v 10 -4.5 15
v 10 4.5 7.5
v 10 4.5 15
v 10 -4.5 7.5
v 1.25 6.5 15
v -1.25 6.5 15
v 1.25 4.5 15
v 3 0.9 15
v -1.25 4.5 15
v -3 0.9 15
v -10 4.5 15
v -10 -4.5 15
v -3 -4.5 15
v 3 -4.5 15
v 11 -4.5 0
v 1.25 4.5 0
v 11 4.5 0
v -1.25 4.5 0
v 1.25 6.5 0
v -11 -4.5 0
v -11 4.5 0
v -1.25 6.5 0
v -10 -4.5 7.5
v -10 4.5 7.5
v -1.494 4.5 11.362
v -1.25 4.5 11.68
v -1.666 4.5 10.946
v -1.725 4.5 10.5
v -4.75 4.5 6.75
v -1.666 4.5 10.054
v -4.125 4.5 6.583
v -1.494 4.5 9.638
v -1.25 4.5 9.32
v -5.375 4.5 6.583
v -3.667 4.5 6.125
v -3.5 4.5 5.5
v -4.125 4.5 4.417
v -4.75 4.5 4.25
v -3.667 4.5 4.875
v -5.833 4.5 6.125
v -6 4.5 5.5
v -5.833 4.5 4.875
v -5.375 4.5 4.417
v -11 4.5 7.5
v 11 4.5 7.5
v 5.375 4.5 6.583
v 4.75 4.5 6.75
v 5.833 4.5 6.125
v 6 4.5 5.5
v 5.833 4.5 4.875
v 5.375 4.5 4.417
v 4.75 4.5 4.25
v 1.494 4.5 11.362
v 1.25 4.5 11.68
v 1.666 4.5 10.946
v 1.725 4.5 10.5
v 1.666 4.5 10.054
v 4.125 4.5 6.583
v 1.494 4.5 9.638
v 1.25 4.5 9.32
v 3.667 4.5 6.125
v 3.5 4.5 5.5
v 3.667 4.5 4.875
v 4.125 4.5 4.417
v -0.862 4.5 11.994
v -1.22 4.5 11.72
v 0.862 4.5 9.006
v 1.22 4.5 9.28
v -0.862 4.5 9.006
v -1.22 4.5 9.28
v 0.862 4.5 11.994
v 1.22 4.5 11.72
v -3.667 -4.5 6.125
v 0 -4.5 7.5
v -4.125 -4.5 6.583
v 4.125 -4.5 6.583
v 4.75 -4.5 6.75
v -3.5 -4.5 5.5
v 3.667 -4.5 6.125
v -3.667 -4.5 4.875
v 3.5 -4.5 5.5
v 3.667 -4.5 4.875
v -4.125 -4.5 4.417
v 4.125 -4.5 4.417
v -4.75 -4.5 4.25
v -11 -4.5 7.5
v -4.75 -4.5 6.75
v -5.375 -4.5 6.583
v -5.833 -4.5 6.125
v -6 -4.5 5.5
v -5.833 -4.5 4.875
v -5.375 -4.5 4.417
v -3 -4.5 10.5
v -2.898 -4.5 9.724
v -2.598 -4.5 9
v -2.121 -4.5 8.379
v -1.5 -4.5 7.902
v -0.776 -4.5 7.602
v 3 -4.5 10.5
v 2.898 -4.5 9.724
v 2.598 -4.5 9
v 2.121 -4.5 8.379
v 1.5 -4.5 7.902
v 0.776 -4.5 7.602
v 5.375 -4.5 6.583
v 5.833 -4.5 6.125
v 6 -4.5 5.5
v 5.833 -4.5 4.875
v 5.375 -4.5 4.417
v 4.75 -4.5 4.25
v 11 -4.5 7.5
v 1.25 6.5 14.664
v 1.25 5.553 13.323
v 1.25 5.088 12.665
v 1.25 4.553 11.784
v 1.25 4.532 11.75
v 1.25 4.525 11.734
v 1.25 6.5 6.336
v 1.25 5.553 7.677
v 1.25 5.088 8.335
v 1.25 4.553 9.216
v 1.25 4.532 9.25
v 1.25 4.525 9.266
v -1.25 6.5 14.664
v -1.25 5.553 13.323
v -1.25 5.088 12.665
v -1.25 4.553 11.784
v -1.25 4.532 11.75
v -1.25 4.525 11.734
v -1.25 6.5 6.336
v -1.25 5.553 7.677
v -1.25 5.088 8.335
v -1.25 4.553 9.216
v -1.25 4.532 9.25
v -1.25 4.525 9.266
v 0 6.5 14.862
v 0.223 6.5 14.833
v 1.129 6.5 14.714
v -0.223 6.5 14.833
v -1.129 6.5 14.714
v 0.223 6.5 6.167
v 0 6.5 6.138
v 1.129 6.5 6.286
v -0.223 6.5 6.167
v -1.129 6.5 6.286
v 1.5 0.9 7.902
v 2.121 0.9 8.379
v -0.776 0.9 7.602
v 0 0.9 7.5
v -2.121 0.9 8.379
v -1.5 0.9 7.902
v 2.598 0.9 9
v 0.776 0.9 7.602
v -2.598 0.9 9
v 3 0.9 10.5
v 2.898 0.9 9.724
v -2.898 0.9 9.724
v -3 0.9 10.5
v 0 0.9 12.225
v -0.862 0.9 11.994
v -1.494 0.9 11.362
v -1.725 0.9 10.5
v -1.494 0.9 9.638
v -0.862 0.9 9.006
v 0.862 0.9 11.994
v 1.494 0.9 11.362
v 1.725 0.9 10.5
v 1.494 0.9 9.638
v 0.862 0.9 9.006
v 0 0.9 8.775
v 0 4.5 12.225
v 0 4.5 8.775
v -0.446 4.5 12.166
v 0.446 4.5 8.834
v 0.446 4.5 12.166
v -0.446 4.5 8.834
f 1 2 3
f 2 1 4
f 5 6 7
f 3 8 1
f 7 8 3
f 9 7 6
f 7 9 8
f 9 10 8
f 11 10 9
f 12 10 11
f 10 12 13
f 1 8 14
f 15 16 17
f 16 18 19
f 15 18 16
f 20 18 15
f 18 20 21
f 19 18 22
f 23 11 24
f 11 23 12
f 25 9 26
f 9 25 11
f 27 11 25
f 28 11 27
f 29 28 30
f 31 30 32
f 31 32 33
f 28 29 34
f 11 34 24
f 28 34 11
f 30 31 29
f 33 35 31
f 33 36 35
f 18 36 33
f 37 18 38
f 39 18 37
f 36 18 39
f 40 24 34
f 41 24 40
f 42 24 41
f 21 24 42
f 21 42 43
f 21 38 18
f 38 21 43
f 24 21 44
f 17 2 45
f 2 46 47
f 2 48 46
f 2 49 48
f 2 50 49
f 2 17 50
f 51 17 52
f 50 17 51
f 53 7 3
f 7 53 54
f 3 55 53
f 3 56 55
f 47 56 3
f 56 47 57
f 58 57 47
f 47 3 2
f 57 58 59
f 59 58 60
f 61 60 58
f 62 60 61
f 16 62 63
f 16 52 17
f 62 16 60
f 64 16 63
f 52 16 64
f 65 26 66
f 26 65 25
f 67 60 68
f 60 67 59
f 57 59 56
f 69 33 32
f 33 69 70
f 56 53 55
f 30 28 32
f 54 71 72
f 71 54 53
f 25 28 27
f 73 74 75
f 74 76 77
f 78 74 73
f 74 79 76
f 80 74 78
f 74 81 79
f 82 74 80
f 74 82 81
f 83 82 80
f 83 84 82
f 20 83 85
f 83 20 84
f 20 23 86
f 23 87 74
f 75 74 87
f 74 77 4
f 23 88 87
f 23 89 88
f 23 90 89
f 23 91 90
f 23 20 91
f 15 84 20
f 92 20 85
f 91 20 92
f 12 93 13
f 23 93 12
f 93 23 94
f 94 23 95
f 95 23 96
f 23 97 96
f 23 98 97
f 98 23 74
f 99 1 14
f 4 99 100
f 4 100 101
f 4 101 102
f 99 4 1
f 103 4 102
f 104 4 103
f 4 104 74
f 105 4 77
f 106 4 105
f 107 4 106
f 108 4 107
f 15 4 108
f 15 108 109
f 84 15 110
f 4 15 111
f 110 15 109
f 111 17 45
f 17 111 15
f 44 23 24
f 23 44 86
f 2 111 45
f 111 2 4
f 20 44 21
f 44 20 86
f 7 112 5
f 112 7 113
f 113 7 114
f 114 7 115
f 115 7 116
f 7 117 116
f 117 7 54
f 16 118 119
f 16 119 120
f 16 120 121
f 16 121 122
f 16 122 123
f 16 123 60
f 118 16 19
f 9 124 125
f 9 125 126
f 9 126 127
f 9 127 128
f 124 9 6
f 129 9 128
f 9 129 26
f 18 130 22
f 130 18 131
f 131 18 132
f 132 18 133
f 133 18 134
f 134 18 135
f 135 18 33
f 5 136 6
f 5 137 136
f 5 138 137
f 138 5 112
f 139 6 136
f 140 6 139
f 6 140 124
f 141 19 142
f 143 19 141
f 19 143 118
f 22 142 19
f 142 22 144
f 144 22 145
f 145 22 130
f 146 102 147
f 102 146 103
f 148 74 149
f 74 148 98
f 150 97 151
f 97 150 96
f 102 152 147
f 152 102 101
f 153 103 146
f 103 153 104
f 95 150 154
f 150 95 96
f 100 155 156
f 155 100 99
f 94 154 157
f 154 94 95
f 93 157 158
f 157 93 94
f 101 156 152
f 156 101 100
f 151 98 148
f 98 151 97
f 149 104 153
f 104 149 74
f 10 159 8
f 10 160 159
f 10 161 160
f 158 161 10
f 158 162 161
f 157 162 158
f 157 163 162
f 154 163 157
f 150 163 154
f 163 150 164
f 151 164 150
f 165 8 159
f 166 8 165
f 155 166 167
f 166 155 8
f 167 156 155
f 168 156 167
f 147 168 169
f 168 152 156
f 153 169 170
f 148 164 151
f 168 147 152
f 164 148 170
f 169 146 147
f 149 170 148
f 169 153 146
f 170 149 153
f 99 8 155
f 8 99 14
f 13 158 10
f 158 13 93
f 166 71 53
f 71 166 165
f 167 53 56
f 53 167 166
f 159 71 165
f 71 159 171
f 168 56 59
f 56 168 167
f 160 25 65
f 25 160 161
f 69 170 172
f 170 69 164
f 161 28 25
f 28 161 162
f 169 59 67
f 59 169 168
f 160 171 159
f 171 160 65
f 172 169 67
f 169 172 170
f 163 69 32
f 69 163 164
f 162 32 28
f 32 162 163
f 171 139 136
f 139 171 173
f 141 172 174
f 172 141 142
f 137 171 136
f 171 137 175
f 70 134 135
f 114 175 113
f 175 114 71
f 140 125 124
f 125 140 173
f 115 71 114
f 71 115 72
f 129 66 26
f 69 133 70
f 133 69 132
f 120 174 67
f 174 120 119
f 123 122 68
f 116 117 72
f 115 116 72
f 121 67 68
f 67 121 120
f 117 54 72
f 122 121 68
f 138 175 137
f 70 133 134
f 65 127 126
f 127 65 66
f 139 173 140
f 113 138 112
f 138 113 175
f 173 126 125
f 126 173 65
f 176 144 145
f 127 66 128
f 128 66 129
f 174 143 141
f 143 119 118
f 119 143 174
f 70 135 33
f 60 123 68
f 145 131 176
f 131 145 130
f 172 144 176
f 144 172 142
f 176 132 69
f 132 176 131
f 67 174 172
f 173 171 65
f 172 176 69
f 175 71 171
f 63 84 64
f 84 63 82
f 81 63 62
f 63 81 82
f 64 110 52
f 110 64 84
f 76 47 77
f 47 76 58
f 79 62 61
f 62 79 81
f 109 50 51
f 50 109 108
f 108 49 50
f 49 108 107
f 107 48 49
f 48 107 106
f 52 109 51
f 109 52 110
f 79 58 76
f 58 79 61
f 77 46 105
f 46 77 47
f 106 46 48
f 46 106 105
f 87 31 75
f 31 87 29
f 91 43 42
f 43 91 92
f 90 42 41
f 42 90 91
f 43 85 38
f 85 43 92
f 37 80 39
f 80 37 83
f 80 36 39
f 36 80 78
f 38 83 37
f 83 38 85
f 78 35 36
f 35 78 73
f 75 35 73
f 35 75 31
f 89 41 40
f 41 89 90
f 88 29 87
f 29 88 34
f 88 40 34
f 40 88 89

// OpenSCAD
// file: microswitch.scad
// Don't print this file, purchase real micro switches
// e.g. Honeywell ZM10B10A01 or OMRON SS-5 or similar.

module microswitch() {
  difference() {
    union() {
      translate([0, 0, 2.5])
        cube([19.8, 6, 10], center=true);
      translate([2.5, 0.5, 6])
        cube([2, 3.5, 5], center=true);
      for (x = [-8, -1, 8]) {
        translate([x, 0, 0])
          cube([0.6, 3.2, 13], center=true);
      }
    }
    for (x = [-9.5/2, 9.5/2]) {
      translate([x, 0, 0]) rotate([90, 0, 0])
        cylinder(r=2.5/2, h=20, center=true, $fn=12);
    }
  }
}

microswitch();
// file: configuration.scad
// Increase this if your slicer or printer make holes too tight.
extra_radius = 0.1;

// OD = outside diameter, corner to corner.
m3_nut_od = 6.1;
m3_nut_radius = m3_nut_od/2 + 0.2 + extra_radius;
m3_washer_radius = 3.5 + extra_radius;

// Major diameter of metric 3mm thread.
m3_major = 2.85;
m3_radius = m3_major/2 + extra_radius;
m3_wide_radius = m3_major/2 + extra_radius + 0.2;

// NEMA17 stepper motors.
motor_shaft_diameter = 5;
motor_shaft_radius = motor_shaft_diameter/2 + extra_radius;

// Frame brackets. M3x8mm screws work best with 3.6 mm brackets.
thickness = 3.6;

// OpenBeam or Misumi. Currently only 15x15 mm, but there is a plan
// to make models more parametric and allow 20x20 mm in the future.
extrusion = 20;

// Placement for the NEMA17 stepper motors.
motor_offset = 44;
motor_length = 47;
// main file
include <configuration.scad>;

use <microswitch.scad>;

thickness = 9;  // 1mm thicker than linear rail.
width = 20;  // Same as vertical extrusion.
height = 15;

module endstop() {
  difference() {
    union() {
      cube([width, thickness, height], center=true);
      translate([0, 0, -height/4])
        cube([width+2, thickness, height/2], center=true);
      translate([0, 2, 0])
        cube([2.5, thickness, height], center=true);
    }
    translate([0, 0, 3]) rotate([90, 0, 0]) {
      cylinder(r=m3_wide_radius, h=20, center=true, $fn=12);
      translate([0, 0, 3.6-thickness/2]) {
        cylinder(r=3, h=10, $fn=24);
        translate([0, 5, 5])
          cube([6, 10, 10], center=true);
      }
      translate([0, 0, -thickness/2]) scale([1, 1, -1])
        cylinder(r1=m3_wide_radius, r2=7, h=4, $fn=24);
    }
    translate([0, -3-thickness/2, -2]) rotate([0, 180, 0]) {
      % microswitch();
      for (x = [-9.5/2, 9.5/2]) {
        translate([x, 0, 0]) rotate([90, 0, 0])
          cylinder(r=2.5/2, h=40, center=true, $fn=12);
      }
    }
  }
}

translate([0, 0, height/2]) endstop();
